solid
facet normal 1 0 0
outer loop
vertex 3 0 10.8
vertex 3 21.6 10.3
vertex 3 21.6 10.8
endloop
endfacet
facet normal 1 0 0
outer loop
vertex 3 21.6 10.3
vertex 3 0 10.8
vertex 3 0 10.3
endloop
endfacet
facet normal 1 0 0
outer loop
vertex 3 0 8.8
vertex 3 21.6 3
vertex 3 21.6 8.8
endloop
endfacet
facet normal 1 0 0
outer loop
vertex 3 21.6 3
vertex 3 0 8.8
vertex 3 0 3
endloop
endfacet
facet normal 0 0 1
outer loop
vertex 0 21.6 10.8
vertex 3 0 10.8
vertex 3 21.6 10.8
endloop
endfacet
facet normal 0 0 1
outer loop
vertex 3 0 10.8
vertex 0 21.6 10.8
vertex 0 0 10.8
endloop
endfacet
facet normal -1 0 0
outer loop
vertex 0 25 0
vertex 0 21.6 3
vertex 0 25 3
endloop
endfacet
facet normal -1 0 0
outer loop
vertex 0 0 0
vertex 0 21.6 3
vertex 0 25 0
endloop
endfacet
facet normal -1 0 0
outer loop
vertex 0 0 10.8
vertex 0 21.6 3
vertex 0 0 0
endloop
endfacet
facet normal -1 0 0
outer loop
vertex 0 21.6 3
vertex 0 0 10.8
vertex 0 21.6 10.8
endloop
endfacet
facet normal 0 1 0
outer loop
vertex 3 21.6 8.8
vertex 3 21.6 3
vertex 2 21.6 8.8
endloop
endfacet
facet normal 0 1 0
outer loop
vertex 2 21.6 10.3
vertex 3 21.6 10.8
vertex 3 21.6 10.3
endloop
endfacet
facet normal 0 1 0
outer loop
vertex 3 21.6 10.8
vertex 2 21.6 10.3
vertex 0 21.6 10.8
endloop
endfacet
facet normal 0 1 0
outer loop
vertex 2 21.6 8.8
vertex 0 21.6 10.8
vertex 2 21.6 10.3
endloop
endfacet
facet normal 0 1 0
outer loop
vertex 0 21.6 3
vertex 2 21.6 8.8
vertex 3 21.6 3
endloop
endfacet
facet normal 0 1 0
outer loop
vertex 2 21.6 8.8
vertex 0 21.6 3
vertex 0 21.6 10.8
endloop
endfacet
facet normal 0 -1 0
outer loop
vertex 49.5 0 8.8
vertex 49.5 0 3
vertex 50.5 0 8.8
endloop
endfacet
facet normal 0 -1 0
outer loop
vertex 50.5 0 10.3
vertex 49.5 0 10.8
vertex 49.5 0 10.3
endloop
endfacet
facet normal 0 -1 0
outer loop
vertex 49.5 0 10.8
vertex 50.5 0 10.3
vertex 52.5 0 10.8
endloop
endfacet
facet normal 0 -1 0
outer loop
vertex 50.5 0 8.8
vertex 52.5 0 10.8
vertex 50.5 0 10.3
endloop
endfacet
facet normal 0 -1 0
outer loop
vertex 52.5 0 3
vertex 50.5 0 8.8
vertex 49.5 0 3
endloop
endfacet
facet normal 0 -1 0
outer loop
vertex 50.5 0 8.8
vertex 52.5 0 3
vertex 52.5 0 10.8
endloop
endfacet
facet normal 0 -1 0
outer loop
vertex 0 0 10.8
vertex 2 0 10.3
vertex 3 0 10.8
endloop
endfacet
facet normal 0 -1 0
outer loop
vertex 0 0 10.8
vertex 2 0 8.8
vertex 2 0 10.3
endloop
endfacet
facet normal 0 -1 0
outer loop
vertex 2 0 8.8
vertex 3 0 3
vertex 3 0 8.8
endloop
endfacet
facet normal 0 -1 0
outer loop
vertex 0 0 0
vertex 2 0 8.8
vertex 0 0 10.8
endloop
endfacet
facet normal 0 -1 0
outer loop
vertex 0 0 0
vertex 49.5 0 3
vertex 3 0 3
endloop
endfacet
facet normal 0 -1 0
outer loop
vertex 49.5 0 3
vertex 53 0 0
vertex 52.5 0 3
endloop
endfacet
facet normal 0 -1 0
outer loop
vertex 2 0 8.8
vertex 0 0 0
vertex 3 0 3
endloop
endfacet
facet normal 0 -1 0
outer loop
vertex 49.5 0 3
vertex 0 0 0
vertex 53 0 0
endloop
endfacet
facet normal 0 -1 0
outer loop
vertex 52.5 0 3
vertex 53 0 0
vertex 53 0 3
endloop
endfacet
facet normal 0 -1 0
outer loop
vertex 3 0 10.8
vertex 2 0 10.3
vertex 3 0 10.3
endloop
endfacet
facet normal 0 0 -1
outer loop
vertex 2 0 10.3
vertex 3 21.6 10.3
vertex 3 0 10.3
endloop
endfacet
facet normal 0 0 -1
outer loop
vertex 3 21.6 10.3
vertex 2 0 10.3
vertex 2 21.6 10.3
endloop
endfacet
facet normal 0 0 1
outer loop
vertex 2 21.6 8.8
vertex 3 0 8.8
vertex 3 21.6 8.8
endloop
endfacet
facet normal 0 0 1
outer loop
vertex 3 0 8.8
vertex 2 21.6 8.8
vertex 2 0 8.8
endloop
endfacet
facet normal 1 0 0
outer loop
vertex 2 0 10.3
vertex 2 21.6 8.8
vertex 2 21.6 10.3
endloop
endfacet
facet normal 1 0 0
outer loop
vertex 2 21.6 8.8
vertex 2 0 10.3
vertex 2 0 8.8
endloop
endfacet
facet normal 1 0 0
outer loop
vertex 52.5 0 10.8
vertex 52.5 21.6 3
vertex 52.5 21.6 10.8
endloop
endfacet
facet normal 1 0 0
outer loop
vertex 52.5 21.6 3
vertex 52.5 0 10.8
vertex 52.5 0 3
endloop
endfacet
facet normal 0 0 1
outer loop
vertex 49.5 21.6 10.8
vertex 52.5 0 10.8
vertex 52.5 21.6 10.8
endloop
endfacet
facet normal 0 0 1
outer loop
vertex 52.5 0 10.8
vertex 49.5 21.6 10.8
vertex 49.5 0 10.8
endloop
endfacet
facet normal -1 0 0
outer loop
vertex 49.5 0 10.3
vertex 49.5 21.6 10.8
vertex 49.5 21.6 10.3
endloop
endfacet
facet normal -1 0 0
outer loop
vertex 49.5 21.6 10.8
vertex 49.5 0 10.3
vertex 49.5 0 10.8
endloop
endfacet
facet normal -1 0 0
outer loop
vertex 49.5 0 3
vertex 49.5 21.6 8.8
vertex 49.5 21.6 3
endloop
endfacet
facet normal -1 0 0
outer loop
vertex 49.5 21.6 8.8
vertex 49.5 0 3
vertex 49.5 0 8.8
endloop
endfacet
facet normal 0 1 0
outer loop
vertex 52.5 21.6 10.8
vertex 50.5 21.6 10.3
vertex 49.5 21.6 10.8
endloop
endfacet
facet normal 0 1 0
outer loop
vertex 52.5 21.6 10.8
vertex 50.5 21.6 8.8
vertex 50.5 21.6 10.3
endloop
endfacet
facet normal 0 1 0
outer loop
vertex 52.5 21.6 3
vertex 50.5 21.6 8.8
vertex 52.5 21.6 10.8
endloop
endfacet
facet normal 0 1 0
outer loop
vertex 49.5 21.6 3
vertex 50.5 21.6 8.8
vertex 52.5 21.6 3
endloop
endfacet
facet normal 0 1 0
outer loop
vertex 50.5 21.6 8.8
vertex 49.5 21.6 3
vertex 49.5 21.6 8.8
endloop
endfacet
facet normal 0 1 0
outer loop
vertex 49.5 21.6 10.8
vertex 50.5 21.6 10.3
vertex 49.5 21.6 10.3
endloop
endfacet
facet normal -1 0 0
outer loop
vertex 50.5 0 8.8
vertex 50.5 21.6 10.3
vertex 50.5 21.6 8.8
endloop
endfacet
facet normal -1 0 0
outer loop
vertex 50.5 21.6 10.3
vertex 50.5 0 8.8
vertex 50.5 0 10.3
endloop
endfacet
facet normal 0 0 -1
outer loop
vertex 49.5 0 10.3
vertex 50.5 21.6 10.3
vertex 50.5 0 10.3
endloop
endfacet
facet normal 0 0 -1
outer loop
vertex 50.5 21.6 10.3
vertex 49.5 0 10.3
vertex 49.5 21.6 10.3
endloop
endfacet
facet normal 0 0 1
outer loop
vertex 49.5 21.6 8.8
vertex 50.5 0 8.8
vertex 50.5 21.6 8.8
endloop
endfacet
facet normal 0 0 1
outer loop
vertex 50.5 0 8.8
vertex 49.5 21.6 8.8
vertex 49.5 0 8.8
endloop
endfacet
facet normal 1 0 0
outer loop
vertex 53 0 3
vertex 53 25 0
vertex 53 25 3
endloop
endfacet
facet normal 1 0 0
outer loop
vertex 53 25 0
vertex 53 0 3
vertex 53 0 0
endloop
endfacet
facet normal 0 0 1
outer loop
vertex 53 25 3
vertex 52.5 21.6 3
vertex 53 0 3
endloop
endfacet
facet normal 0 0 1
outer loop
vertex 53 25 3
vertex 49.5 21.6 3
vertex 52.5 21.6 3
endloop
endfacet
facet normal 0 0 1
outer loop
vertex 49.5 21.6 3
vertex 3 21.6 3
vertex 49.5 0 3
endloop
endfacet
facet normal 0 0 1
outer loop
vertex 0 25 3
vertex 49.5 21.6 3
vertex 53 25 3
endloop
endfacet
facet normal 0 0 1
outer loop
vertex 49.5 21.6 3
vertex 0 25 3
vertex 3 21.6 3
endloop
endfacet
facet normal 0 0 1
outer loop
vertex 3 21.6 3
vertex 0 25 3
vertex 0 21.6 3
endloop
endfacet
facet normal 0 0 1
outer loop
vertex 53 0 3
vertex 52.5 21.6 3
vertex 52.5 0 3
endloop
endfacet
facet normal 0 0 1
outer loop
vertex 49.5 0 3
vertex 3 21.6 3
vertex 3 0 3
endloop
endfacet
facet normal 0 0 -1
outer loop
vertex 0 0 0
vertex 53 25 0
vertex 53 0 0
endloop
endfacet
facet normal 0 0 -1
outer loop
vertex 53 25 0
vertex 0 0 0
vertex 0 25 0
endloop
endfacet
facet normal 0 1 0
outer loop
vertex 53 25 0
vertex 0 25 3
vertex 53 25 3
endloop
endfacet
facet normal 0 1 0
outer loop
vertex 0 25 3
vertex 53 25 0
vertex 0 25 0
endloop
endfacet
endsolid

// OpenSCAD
// dc to dc mount
// velleman vma404
// slide in mount
// board size:
dcdcWidth=21.6;
dcdcLength=47.5;
dcdcThick=1.5;

// board slips in the wide way with slots on the narrow sides.abs
module dcdcSlots(){
    difference(){
        cube([3,dcdcWidth,8]);
        translate([2,-1,6])
            cube([5,dcdcWidth+2,1.5]);
    }
    translate([dcdcLength+2,0,0]){
        difference(){
            cube([3,dcdcWidth,8]);
            translate([-4,-1,6])
                cube([5,dcdcWidth+2,1.5]);
        }
    }
}    

module dcdcPlate(){
// the test of the mounts
    union(){
        cube([53,25,3]);
        translate([0,0,2.8])
            dcdcSlots();
    }
}
dcdcPlate();
//dcdcSlots();
